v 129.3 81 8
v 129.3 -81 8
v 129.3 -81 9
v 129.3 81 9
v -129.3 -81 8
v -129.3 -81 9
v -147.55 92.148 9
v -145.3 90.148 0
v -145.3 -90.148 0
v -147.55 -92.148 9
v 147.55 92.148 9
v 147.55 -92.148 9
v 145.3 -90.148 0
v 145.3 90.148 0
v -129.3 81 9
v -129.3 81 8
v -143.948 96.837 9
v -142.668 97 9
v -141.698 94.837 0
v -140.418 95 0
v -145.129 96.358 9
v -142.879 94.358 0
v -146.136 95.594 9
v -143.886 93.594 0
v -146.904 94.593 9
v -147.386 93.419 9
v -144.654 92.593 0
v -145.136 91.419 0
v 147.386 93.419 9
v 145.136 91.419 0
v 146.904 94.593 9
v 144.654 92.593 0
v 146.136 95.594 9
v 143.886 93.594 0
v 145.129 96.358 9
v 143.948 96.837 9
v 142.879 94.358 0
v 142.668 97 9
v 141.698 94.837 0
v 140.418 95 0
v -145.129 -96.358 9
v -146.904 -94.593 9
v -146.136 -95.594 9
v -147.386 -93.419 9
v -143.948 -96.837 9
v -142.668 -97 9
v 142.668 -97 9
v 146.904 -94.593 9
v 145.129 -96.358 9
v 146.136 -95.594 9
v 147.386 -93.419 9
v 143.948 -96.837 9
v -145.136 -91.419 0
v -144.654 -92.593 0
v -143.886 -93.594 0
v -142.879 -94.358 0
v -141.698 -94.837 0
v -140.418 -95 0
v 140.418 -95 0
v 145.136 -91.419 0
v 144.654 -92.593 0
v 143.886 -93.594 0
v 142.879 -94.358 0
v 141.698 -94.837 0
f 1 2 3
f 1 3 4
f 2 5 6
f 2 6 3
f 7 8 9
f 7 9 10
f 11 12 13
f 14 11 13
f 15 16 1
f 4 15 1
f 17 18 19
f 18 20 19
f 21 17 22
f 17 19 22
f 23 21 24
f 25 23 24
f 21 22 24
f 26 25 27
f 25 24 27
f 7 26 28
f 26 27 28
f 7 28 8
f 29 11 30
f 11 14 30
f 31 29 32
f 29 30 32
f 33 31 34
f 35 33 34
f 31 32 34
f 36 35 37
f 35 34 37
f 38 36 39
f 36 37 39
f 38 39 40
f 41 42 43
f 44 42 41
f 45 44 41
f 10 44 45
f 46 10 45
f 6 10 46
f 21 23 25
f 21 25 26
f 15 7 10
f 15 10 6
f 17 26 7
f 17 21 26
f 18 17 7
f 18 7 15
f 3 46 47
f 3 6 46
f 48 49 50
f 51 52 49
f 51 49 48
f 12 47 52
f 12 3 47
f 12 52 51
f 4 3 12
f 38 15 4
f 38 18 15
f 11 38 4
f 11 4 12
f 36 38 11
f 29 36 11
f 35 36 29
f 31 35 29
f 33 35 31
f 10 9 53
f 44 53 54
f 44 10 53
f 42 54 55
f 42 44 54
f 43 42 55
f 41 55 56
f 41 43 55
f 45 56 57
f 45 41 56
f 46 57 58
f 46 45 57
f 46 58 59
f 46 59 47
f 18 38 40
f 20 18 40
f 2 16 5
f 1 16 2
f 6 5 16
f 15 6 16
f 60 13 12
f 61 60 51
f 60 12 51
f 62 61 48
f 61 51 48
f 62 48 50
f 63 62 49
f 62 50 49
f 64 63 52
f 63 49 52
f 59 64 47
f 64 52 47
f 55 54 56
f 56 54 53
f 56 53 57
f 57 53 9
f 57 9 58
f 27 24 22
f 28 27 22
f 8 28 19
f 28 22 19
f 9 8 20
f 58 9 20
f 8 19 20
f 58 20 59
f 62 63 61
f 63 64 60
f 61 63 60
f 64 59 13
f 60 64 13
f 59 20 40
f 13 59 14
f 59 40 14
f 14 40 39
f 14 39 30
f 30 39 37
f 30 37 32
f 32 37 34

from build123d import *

# Parameters (mm, degrees)
F0_W     = 258.6008906364
F0_H     = 162.0002239943
F1_DEPTH = 9
F3_DEPTH = 330.2
F5_DEPTH = 190.5
F6_R     = 5
F7_START = 8
F7_DEPTH = 2


with BuildPart() as f1:
    # F0 (on Top) → F1 (new body)
    with BuildSketch(Plane.XY):
        Polygon((-141, -97.0001119971), (141, -97.0001119971), (147.5504453182, -97.0001119971), (147.5504453182, -92.0001119971), (147.5504453182, 97.0001119971), (141, 97.0001119971), (-141, 97.0001119971), (-147.5504453182, 97.0001119971), (-147.5504453182, -92.0001119971), (-147.5504453182, -97.0001119971), align=None)
        Polygon((145.3004453182, -95.0001119971), (138.75, -95.0001119971), (-138.75, -95.0001119971), (-145.3004453182, -95.0001119971), (-145.3004453182, -90.0001119971), (-145.3004453182, 95.0001119971), (-138.75, 95.0001119971), (138.75, 95.0001119971), (145.3004453182, 95.0001119971), (145.3004453182, -90.0001119971), align=None, mode=Mode.SUBTRACT)
        Polygon((-138.75, -95.0001119971), (138.75, -95.0001119971), (145.3004453182, -95.0001119971), (145.3004453182, -90.0001119971), (145.3004453182, 95.0001119971), (138.75, 95.0001119971), (-138.75, 95.0001119971), (-145.3004453182, 95.0001119971), (-145.3004453182, -90.0001119971), (-145.3004453182, -95.0001119971), align=None)
        Rectangle(F0_W, F0_H, mode=Mode.SUBTRACT)
        Rectangle(F0_W, F0_H)
    extrude(amount=F1_DEPTH)

    # F2 (on face) → F3 (cut)
    with BuildSketch(Plane.YZ.offset(147.5504453182)):
        Polygon((97.0001119971, 9), (95.0001119971, 0), (97.0001119971, 0), align=None)
        Polygon((-97.0001119971, 0), (-95.0001119971, 0), (-97.0001119971, 9), align=None)
    extrude(amount=-F3_DEPTH, mode=Mode.SUBTRACT)

    # F4 (on Front) → F5 (cut, symmetric)
    with BuildSketch(Plane.XZ):
        Polygon((-147.5504453182, 0), (-145.3004453182, 0), (-147.5504453182, 9), align=None)
        Polygon((147.5504453182, 9), (145.3004453182, 0), (147.5504453182, 0), align=None)
    extrude(amount=F5_DEPTH, both=True, mode=Mode.SUBTRACT)

    # F6
    f6_edges = [f1.edges().sort_by_distance(p)[0] for p in [
        (146.425445, -96.000112, 4.5),
        (-146.425445, -96.000112, 4.5),
        (146.425445, 96.000112, 4.5),
        (-146.425445, 96.000112, 4.5),
    ]]
    fillet(f6_edges, radius=F6_R)

    # F0 (on Top) → F7 (cut)
    with BuildSketch(Plane.XY.offset(F7_START)):
        Rectangle(F0_W, F0_H)
    extrude(amount=F7_DEPTH, mode=Mode.SUBTRACT)


solid = f1.part
